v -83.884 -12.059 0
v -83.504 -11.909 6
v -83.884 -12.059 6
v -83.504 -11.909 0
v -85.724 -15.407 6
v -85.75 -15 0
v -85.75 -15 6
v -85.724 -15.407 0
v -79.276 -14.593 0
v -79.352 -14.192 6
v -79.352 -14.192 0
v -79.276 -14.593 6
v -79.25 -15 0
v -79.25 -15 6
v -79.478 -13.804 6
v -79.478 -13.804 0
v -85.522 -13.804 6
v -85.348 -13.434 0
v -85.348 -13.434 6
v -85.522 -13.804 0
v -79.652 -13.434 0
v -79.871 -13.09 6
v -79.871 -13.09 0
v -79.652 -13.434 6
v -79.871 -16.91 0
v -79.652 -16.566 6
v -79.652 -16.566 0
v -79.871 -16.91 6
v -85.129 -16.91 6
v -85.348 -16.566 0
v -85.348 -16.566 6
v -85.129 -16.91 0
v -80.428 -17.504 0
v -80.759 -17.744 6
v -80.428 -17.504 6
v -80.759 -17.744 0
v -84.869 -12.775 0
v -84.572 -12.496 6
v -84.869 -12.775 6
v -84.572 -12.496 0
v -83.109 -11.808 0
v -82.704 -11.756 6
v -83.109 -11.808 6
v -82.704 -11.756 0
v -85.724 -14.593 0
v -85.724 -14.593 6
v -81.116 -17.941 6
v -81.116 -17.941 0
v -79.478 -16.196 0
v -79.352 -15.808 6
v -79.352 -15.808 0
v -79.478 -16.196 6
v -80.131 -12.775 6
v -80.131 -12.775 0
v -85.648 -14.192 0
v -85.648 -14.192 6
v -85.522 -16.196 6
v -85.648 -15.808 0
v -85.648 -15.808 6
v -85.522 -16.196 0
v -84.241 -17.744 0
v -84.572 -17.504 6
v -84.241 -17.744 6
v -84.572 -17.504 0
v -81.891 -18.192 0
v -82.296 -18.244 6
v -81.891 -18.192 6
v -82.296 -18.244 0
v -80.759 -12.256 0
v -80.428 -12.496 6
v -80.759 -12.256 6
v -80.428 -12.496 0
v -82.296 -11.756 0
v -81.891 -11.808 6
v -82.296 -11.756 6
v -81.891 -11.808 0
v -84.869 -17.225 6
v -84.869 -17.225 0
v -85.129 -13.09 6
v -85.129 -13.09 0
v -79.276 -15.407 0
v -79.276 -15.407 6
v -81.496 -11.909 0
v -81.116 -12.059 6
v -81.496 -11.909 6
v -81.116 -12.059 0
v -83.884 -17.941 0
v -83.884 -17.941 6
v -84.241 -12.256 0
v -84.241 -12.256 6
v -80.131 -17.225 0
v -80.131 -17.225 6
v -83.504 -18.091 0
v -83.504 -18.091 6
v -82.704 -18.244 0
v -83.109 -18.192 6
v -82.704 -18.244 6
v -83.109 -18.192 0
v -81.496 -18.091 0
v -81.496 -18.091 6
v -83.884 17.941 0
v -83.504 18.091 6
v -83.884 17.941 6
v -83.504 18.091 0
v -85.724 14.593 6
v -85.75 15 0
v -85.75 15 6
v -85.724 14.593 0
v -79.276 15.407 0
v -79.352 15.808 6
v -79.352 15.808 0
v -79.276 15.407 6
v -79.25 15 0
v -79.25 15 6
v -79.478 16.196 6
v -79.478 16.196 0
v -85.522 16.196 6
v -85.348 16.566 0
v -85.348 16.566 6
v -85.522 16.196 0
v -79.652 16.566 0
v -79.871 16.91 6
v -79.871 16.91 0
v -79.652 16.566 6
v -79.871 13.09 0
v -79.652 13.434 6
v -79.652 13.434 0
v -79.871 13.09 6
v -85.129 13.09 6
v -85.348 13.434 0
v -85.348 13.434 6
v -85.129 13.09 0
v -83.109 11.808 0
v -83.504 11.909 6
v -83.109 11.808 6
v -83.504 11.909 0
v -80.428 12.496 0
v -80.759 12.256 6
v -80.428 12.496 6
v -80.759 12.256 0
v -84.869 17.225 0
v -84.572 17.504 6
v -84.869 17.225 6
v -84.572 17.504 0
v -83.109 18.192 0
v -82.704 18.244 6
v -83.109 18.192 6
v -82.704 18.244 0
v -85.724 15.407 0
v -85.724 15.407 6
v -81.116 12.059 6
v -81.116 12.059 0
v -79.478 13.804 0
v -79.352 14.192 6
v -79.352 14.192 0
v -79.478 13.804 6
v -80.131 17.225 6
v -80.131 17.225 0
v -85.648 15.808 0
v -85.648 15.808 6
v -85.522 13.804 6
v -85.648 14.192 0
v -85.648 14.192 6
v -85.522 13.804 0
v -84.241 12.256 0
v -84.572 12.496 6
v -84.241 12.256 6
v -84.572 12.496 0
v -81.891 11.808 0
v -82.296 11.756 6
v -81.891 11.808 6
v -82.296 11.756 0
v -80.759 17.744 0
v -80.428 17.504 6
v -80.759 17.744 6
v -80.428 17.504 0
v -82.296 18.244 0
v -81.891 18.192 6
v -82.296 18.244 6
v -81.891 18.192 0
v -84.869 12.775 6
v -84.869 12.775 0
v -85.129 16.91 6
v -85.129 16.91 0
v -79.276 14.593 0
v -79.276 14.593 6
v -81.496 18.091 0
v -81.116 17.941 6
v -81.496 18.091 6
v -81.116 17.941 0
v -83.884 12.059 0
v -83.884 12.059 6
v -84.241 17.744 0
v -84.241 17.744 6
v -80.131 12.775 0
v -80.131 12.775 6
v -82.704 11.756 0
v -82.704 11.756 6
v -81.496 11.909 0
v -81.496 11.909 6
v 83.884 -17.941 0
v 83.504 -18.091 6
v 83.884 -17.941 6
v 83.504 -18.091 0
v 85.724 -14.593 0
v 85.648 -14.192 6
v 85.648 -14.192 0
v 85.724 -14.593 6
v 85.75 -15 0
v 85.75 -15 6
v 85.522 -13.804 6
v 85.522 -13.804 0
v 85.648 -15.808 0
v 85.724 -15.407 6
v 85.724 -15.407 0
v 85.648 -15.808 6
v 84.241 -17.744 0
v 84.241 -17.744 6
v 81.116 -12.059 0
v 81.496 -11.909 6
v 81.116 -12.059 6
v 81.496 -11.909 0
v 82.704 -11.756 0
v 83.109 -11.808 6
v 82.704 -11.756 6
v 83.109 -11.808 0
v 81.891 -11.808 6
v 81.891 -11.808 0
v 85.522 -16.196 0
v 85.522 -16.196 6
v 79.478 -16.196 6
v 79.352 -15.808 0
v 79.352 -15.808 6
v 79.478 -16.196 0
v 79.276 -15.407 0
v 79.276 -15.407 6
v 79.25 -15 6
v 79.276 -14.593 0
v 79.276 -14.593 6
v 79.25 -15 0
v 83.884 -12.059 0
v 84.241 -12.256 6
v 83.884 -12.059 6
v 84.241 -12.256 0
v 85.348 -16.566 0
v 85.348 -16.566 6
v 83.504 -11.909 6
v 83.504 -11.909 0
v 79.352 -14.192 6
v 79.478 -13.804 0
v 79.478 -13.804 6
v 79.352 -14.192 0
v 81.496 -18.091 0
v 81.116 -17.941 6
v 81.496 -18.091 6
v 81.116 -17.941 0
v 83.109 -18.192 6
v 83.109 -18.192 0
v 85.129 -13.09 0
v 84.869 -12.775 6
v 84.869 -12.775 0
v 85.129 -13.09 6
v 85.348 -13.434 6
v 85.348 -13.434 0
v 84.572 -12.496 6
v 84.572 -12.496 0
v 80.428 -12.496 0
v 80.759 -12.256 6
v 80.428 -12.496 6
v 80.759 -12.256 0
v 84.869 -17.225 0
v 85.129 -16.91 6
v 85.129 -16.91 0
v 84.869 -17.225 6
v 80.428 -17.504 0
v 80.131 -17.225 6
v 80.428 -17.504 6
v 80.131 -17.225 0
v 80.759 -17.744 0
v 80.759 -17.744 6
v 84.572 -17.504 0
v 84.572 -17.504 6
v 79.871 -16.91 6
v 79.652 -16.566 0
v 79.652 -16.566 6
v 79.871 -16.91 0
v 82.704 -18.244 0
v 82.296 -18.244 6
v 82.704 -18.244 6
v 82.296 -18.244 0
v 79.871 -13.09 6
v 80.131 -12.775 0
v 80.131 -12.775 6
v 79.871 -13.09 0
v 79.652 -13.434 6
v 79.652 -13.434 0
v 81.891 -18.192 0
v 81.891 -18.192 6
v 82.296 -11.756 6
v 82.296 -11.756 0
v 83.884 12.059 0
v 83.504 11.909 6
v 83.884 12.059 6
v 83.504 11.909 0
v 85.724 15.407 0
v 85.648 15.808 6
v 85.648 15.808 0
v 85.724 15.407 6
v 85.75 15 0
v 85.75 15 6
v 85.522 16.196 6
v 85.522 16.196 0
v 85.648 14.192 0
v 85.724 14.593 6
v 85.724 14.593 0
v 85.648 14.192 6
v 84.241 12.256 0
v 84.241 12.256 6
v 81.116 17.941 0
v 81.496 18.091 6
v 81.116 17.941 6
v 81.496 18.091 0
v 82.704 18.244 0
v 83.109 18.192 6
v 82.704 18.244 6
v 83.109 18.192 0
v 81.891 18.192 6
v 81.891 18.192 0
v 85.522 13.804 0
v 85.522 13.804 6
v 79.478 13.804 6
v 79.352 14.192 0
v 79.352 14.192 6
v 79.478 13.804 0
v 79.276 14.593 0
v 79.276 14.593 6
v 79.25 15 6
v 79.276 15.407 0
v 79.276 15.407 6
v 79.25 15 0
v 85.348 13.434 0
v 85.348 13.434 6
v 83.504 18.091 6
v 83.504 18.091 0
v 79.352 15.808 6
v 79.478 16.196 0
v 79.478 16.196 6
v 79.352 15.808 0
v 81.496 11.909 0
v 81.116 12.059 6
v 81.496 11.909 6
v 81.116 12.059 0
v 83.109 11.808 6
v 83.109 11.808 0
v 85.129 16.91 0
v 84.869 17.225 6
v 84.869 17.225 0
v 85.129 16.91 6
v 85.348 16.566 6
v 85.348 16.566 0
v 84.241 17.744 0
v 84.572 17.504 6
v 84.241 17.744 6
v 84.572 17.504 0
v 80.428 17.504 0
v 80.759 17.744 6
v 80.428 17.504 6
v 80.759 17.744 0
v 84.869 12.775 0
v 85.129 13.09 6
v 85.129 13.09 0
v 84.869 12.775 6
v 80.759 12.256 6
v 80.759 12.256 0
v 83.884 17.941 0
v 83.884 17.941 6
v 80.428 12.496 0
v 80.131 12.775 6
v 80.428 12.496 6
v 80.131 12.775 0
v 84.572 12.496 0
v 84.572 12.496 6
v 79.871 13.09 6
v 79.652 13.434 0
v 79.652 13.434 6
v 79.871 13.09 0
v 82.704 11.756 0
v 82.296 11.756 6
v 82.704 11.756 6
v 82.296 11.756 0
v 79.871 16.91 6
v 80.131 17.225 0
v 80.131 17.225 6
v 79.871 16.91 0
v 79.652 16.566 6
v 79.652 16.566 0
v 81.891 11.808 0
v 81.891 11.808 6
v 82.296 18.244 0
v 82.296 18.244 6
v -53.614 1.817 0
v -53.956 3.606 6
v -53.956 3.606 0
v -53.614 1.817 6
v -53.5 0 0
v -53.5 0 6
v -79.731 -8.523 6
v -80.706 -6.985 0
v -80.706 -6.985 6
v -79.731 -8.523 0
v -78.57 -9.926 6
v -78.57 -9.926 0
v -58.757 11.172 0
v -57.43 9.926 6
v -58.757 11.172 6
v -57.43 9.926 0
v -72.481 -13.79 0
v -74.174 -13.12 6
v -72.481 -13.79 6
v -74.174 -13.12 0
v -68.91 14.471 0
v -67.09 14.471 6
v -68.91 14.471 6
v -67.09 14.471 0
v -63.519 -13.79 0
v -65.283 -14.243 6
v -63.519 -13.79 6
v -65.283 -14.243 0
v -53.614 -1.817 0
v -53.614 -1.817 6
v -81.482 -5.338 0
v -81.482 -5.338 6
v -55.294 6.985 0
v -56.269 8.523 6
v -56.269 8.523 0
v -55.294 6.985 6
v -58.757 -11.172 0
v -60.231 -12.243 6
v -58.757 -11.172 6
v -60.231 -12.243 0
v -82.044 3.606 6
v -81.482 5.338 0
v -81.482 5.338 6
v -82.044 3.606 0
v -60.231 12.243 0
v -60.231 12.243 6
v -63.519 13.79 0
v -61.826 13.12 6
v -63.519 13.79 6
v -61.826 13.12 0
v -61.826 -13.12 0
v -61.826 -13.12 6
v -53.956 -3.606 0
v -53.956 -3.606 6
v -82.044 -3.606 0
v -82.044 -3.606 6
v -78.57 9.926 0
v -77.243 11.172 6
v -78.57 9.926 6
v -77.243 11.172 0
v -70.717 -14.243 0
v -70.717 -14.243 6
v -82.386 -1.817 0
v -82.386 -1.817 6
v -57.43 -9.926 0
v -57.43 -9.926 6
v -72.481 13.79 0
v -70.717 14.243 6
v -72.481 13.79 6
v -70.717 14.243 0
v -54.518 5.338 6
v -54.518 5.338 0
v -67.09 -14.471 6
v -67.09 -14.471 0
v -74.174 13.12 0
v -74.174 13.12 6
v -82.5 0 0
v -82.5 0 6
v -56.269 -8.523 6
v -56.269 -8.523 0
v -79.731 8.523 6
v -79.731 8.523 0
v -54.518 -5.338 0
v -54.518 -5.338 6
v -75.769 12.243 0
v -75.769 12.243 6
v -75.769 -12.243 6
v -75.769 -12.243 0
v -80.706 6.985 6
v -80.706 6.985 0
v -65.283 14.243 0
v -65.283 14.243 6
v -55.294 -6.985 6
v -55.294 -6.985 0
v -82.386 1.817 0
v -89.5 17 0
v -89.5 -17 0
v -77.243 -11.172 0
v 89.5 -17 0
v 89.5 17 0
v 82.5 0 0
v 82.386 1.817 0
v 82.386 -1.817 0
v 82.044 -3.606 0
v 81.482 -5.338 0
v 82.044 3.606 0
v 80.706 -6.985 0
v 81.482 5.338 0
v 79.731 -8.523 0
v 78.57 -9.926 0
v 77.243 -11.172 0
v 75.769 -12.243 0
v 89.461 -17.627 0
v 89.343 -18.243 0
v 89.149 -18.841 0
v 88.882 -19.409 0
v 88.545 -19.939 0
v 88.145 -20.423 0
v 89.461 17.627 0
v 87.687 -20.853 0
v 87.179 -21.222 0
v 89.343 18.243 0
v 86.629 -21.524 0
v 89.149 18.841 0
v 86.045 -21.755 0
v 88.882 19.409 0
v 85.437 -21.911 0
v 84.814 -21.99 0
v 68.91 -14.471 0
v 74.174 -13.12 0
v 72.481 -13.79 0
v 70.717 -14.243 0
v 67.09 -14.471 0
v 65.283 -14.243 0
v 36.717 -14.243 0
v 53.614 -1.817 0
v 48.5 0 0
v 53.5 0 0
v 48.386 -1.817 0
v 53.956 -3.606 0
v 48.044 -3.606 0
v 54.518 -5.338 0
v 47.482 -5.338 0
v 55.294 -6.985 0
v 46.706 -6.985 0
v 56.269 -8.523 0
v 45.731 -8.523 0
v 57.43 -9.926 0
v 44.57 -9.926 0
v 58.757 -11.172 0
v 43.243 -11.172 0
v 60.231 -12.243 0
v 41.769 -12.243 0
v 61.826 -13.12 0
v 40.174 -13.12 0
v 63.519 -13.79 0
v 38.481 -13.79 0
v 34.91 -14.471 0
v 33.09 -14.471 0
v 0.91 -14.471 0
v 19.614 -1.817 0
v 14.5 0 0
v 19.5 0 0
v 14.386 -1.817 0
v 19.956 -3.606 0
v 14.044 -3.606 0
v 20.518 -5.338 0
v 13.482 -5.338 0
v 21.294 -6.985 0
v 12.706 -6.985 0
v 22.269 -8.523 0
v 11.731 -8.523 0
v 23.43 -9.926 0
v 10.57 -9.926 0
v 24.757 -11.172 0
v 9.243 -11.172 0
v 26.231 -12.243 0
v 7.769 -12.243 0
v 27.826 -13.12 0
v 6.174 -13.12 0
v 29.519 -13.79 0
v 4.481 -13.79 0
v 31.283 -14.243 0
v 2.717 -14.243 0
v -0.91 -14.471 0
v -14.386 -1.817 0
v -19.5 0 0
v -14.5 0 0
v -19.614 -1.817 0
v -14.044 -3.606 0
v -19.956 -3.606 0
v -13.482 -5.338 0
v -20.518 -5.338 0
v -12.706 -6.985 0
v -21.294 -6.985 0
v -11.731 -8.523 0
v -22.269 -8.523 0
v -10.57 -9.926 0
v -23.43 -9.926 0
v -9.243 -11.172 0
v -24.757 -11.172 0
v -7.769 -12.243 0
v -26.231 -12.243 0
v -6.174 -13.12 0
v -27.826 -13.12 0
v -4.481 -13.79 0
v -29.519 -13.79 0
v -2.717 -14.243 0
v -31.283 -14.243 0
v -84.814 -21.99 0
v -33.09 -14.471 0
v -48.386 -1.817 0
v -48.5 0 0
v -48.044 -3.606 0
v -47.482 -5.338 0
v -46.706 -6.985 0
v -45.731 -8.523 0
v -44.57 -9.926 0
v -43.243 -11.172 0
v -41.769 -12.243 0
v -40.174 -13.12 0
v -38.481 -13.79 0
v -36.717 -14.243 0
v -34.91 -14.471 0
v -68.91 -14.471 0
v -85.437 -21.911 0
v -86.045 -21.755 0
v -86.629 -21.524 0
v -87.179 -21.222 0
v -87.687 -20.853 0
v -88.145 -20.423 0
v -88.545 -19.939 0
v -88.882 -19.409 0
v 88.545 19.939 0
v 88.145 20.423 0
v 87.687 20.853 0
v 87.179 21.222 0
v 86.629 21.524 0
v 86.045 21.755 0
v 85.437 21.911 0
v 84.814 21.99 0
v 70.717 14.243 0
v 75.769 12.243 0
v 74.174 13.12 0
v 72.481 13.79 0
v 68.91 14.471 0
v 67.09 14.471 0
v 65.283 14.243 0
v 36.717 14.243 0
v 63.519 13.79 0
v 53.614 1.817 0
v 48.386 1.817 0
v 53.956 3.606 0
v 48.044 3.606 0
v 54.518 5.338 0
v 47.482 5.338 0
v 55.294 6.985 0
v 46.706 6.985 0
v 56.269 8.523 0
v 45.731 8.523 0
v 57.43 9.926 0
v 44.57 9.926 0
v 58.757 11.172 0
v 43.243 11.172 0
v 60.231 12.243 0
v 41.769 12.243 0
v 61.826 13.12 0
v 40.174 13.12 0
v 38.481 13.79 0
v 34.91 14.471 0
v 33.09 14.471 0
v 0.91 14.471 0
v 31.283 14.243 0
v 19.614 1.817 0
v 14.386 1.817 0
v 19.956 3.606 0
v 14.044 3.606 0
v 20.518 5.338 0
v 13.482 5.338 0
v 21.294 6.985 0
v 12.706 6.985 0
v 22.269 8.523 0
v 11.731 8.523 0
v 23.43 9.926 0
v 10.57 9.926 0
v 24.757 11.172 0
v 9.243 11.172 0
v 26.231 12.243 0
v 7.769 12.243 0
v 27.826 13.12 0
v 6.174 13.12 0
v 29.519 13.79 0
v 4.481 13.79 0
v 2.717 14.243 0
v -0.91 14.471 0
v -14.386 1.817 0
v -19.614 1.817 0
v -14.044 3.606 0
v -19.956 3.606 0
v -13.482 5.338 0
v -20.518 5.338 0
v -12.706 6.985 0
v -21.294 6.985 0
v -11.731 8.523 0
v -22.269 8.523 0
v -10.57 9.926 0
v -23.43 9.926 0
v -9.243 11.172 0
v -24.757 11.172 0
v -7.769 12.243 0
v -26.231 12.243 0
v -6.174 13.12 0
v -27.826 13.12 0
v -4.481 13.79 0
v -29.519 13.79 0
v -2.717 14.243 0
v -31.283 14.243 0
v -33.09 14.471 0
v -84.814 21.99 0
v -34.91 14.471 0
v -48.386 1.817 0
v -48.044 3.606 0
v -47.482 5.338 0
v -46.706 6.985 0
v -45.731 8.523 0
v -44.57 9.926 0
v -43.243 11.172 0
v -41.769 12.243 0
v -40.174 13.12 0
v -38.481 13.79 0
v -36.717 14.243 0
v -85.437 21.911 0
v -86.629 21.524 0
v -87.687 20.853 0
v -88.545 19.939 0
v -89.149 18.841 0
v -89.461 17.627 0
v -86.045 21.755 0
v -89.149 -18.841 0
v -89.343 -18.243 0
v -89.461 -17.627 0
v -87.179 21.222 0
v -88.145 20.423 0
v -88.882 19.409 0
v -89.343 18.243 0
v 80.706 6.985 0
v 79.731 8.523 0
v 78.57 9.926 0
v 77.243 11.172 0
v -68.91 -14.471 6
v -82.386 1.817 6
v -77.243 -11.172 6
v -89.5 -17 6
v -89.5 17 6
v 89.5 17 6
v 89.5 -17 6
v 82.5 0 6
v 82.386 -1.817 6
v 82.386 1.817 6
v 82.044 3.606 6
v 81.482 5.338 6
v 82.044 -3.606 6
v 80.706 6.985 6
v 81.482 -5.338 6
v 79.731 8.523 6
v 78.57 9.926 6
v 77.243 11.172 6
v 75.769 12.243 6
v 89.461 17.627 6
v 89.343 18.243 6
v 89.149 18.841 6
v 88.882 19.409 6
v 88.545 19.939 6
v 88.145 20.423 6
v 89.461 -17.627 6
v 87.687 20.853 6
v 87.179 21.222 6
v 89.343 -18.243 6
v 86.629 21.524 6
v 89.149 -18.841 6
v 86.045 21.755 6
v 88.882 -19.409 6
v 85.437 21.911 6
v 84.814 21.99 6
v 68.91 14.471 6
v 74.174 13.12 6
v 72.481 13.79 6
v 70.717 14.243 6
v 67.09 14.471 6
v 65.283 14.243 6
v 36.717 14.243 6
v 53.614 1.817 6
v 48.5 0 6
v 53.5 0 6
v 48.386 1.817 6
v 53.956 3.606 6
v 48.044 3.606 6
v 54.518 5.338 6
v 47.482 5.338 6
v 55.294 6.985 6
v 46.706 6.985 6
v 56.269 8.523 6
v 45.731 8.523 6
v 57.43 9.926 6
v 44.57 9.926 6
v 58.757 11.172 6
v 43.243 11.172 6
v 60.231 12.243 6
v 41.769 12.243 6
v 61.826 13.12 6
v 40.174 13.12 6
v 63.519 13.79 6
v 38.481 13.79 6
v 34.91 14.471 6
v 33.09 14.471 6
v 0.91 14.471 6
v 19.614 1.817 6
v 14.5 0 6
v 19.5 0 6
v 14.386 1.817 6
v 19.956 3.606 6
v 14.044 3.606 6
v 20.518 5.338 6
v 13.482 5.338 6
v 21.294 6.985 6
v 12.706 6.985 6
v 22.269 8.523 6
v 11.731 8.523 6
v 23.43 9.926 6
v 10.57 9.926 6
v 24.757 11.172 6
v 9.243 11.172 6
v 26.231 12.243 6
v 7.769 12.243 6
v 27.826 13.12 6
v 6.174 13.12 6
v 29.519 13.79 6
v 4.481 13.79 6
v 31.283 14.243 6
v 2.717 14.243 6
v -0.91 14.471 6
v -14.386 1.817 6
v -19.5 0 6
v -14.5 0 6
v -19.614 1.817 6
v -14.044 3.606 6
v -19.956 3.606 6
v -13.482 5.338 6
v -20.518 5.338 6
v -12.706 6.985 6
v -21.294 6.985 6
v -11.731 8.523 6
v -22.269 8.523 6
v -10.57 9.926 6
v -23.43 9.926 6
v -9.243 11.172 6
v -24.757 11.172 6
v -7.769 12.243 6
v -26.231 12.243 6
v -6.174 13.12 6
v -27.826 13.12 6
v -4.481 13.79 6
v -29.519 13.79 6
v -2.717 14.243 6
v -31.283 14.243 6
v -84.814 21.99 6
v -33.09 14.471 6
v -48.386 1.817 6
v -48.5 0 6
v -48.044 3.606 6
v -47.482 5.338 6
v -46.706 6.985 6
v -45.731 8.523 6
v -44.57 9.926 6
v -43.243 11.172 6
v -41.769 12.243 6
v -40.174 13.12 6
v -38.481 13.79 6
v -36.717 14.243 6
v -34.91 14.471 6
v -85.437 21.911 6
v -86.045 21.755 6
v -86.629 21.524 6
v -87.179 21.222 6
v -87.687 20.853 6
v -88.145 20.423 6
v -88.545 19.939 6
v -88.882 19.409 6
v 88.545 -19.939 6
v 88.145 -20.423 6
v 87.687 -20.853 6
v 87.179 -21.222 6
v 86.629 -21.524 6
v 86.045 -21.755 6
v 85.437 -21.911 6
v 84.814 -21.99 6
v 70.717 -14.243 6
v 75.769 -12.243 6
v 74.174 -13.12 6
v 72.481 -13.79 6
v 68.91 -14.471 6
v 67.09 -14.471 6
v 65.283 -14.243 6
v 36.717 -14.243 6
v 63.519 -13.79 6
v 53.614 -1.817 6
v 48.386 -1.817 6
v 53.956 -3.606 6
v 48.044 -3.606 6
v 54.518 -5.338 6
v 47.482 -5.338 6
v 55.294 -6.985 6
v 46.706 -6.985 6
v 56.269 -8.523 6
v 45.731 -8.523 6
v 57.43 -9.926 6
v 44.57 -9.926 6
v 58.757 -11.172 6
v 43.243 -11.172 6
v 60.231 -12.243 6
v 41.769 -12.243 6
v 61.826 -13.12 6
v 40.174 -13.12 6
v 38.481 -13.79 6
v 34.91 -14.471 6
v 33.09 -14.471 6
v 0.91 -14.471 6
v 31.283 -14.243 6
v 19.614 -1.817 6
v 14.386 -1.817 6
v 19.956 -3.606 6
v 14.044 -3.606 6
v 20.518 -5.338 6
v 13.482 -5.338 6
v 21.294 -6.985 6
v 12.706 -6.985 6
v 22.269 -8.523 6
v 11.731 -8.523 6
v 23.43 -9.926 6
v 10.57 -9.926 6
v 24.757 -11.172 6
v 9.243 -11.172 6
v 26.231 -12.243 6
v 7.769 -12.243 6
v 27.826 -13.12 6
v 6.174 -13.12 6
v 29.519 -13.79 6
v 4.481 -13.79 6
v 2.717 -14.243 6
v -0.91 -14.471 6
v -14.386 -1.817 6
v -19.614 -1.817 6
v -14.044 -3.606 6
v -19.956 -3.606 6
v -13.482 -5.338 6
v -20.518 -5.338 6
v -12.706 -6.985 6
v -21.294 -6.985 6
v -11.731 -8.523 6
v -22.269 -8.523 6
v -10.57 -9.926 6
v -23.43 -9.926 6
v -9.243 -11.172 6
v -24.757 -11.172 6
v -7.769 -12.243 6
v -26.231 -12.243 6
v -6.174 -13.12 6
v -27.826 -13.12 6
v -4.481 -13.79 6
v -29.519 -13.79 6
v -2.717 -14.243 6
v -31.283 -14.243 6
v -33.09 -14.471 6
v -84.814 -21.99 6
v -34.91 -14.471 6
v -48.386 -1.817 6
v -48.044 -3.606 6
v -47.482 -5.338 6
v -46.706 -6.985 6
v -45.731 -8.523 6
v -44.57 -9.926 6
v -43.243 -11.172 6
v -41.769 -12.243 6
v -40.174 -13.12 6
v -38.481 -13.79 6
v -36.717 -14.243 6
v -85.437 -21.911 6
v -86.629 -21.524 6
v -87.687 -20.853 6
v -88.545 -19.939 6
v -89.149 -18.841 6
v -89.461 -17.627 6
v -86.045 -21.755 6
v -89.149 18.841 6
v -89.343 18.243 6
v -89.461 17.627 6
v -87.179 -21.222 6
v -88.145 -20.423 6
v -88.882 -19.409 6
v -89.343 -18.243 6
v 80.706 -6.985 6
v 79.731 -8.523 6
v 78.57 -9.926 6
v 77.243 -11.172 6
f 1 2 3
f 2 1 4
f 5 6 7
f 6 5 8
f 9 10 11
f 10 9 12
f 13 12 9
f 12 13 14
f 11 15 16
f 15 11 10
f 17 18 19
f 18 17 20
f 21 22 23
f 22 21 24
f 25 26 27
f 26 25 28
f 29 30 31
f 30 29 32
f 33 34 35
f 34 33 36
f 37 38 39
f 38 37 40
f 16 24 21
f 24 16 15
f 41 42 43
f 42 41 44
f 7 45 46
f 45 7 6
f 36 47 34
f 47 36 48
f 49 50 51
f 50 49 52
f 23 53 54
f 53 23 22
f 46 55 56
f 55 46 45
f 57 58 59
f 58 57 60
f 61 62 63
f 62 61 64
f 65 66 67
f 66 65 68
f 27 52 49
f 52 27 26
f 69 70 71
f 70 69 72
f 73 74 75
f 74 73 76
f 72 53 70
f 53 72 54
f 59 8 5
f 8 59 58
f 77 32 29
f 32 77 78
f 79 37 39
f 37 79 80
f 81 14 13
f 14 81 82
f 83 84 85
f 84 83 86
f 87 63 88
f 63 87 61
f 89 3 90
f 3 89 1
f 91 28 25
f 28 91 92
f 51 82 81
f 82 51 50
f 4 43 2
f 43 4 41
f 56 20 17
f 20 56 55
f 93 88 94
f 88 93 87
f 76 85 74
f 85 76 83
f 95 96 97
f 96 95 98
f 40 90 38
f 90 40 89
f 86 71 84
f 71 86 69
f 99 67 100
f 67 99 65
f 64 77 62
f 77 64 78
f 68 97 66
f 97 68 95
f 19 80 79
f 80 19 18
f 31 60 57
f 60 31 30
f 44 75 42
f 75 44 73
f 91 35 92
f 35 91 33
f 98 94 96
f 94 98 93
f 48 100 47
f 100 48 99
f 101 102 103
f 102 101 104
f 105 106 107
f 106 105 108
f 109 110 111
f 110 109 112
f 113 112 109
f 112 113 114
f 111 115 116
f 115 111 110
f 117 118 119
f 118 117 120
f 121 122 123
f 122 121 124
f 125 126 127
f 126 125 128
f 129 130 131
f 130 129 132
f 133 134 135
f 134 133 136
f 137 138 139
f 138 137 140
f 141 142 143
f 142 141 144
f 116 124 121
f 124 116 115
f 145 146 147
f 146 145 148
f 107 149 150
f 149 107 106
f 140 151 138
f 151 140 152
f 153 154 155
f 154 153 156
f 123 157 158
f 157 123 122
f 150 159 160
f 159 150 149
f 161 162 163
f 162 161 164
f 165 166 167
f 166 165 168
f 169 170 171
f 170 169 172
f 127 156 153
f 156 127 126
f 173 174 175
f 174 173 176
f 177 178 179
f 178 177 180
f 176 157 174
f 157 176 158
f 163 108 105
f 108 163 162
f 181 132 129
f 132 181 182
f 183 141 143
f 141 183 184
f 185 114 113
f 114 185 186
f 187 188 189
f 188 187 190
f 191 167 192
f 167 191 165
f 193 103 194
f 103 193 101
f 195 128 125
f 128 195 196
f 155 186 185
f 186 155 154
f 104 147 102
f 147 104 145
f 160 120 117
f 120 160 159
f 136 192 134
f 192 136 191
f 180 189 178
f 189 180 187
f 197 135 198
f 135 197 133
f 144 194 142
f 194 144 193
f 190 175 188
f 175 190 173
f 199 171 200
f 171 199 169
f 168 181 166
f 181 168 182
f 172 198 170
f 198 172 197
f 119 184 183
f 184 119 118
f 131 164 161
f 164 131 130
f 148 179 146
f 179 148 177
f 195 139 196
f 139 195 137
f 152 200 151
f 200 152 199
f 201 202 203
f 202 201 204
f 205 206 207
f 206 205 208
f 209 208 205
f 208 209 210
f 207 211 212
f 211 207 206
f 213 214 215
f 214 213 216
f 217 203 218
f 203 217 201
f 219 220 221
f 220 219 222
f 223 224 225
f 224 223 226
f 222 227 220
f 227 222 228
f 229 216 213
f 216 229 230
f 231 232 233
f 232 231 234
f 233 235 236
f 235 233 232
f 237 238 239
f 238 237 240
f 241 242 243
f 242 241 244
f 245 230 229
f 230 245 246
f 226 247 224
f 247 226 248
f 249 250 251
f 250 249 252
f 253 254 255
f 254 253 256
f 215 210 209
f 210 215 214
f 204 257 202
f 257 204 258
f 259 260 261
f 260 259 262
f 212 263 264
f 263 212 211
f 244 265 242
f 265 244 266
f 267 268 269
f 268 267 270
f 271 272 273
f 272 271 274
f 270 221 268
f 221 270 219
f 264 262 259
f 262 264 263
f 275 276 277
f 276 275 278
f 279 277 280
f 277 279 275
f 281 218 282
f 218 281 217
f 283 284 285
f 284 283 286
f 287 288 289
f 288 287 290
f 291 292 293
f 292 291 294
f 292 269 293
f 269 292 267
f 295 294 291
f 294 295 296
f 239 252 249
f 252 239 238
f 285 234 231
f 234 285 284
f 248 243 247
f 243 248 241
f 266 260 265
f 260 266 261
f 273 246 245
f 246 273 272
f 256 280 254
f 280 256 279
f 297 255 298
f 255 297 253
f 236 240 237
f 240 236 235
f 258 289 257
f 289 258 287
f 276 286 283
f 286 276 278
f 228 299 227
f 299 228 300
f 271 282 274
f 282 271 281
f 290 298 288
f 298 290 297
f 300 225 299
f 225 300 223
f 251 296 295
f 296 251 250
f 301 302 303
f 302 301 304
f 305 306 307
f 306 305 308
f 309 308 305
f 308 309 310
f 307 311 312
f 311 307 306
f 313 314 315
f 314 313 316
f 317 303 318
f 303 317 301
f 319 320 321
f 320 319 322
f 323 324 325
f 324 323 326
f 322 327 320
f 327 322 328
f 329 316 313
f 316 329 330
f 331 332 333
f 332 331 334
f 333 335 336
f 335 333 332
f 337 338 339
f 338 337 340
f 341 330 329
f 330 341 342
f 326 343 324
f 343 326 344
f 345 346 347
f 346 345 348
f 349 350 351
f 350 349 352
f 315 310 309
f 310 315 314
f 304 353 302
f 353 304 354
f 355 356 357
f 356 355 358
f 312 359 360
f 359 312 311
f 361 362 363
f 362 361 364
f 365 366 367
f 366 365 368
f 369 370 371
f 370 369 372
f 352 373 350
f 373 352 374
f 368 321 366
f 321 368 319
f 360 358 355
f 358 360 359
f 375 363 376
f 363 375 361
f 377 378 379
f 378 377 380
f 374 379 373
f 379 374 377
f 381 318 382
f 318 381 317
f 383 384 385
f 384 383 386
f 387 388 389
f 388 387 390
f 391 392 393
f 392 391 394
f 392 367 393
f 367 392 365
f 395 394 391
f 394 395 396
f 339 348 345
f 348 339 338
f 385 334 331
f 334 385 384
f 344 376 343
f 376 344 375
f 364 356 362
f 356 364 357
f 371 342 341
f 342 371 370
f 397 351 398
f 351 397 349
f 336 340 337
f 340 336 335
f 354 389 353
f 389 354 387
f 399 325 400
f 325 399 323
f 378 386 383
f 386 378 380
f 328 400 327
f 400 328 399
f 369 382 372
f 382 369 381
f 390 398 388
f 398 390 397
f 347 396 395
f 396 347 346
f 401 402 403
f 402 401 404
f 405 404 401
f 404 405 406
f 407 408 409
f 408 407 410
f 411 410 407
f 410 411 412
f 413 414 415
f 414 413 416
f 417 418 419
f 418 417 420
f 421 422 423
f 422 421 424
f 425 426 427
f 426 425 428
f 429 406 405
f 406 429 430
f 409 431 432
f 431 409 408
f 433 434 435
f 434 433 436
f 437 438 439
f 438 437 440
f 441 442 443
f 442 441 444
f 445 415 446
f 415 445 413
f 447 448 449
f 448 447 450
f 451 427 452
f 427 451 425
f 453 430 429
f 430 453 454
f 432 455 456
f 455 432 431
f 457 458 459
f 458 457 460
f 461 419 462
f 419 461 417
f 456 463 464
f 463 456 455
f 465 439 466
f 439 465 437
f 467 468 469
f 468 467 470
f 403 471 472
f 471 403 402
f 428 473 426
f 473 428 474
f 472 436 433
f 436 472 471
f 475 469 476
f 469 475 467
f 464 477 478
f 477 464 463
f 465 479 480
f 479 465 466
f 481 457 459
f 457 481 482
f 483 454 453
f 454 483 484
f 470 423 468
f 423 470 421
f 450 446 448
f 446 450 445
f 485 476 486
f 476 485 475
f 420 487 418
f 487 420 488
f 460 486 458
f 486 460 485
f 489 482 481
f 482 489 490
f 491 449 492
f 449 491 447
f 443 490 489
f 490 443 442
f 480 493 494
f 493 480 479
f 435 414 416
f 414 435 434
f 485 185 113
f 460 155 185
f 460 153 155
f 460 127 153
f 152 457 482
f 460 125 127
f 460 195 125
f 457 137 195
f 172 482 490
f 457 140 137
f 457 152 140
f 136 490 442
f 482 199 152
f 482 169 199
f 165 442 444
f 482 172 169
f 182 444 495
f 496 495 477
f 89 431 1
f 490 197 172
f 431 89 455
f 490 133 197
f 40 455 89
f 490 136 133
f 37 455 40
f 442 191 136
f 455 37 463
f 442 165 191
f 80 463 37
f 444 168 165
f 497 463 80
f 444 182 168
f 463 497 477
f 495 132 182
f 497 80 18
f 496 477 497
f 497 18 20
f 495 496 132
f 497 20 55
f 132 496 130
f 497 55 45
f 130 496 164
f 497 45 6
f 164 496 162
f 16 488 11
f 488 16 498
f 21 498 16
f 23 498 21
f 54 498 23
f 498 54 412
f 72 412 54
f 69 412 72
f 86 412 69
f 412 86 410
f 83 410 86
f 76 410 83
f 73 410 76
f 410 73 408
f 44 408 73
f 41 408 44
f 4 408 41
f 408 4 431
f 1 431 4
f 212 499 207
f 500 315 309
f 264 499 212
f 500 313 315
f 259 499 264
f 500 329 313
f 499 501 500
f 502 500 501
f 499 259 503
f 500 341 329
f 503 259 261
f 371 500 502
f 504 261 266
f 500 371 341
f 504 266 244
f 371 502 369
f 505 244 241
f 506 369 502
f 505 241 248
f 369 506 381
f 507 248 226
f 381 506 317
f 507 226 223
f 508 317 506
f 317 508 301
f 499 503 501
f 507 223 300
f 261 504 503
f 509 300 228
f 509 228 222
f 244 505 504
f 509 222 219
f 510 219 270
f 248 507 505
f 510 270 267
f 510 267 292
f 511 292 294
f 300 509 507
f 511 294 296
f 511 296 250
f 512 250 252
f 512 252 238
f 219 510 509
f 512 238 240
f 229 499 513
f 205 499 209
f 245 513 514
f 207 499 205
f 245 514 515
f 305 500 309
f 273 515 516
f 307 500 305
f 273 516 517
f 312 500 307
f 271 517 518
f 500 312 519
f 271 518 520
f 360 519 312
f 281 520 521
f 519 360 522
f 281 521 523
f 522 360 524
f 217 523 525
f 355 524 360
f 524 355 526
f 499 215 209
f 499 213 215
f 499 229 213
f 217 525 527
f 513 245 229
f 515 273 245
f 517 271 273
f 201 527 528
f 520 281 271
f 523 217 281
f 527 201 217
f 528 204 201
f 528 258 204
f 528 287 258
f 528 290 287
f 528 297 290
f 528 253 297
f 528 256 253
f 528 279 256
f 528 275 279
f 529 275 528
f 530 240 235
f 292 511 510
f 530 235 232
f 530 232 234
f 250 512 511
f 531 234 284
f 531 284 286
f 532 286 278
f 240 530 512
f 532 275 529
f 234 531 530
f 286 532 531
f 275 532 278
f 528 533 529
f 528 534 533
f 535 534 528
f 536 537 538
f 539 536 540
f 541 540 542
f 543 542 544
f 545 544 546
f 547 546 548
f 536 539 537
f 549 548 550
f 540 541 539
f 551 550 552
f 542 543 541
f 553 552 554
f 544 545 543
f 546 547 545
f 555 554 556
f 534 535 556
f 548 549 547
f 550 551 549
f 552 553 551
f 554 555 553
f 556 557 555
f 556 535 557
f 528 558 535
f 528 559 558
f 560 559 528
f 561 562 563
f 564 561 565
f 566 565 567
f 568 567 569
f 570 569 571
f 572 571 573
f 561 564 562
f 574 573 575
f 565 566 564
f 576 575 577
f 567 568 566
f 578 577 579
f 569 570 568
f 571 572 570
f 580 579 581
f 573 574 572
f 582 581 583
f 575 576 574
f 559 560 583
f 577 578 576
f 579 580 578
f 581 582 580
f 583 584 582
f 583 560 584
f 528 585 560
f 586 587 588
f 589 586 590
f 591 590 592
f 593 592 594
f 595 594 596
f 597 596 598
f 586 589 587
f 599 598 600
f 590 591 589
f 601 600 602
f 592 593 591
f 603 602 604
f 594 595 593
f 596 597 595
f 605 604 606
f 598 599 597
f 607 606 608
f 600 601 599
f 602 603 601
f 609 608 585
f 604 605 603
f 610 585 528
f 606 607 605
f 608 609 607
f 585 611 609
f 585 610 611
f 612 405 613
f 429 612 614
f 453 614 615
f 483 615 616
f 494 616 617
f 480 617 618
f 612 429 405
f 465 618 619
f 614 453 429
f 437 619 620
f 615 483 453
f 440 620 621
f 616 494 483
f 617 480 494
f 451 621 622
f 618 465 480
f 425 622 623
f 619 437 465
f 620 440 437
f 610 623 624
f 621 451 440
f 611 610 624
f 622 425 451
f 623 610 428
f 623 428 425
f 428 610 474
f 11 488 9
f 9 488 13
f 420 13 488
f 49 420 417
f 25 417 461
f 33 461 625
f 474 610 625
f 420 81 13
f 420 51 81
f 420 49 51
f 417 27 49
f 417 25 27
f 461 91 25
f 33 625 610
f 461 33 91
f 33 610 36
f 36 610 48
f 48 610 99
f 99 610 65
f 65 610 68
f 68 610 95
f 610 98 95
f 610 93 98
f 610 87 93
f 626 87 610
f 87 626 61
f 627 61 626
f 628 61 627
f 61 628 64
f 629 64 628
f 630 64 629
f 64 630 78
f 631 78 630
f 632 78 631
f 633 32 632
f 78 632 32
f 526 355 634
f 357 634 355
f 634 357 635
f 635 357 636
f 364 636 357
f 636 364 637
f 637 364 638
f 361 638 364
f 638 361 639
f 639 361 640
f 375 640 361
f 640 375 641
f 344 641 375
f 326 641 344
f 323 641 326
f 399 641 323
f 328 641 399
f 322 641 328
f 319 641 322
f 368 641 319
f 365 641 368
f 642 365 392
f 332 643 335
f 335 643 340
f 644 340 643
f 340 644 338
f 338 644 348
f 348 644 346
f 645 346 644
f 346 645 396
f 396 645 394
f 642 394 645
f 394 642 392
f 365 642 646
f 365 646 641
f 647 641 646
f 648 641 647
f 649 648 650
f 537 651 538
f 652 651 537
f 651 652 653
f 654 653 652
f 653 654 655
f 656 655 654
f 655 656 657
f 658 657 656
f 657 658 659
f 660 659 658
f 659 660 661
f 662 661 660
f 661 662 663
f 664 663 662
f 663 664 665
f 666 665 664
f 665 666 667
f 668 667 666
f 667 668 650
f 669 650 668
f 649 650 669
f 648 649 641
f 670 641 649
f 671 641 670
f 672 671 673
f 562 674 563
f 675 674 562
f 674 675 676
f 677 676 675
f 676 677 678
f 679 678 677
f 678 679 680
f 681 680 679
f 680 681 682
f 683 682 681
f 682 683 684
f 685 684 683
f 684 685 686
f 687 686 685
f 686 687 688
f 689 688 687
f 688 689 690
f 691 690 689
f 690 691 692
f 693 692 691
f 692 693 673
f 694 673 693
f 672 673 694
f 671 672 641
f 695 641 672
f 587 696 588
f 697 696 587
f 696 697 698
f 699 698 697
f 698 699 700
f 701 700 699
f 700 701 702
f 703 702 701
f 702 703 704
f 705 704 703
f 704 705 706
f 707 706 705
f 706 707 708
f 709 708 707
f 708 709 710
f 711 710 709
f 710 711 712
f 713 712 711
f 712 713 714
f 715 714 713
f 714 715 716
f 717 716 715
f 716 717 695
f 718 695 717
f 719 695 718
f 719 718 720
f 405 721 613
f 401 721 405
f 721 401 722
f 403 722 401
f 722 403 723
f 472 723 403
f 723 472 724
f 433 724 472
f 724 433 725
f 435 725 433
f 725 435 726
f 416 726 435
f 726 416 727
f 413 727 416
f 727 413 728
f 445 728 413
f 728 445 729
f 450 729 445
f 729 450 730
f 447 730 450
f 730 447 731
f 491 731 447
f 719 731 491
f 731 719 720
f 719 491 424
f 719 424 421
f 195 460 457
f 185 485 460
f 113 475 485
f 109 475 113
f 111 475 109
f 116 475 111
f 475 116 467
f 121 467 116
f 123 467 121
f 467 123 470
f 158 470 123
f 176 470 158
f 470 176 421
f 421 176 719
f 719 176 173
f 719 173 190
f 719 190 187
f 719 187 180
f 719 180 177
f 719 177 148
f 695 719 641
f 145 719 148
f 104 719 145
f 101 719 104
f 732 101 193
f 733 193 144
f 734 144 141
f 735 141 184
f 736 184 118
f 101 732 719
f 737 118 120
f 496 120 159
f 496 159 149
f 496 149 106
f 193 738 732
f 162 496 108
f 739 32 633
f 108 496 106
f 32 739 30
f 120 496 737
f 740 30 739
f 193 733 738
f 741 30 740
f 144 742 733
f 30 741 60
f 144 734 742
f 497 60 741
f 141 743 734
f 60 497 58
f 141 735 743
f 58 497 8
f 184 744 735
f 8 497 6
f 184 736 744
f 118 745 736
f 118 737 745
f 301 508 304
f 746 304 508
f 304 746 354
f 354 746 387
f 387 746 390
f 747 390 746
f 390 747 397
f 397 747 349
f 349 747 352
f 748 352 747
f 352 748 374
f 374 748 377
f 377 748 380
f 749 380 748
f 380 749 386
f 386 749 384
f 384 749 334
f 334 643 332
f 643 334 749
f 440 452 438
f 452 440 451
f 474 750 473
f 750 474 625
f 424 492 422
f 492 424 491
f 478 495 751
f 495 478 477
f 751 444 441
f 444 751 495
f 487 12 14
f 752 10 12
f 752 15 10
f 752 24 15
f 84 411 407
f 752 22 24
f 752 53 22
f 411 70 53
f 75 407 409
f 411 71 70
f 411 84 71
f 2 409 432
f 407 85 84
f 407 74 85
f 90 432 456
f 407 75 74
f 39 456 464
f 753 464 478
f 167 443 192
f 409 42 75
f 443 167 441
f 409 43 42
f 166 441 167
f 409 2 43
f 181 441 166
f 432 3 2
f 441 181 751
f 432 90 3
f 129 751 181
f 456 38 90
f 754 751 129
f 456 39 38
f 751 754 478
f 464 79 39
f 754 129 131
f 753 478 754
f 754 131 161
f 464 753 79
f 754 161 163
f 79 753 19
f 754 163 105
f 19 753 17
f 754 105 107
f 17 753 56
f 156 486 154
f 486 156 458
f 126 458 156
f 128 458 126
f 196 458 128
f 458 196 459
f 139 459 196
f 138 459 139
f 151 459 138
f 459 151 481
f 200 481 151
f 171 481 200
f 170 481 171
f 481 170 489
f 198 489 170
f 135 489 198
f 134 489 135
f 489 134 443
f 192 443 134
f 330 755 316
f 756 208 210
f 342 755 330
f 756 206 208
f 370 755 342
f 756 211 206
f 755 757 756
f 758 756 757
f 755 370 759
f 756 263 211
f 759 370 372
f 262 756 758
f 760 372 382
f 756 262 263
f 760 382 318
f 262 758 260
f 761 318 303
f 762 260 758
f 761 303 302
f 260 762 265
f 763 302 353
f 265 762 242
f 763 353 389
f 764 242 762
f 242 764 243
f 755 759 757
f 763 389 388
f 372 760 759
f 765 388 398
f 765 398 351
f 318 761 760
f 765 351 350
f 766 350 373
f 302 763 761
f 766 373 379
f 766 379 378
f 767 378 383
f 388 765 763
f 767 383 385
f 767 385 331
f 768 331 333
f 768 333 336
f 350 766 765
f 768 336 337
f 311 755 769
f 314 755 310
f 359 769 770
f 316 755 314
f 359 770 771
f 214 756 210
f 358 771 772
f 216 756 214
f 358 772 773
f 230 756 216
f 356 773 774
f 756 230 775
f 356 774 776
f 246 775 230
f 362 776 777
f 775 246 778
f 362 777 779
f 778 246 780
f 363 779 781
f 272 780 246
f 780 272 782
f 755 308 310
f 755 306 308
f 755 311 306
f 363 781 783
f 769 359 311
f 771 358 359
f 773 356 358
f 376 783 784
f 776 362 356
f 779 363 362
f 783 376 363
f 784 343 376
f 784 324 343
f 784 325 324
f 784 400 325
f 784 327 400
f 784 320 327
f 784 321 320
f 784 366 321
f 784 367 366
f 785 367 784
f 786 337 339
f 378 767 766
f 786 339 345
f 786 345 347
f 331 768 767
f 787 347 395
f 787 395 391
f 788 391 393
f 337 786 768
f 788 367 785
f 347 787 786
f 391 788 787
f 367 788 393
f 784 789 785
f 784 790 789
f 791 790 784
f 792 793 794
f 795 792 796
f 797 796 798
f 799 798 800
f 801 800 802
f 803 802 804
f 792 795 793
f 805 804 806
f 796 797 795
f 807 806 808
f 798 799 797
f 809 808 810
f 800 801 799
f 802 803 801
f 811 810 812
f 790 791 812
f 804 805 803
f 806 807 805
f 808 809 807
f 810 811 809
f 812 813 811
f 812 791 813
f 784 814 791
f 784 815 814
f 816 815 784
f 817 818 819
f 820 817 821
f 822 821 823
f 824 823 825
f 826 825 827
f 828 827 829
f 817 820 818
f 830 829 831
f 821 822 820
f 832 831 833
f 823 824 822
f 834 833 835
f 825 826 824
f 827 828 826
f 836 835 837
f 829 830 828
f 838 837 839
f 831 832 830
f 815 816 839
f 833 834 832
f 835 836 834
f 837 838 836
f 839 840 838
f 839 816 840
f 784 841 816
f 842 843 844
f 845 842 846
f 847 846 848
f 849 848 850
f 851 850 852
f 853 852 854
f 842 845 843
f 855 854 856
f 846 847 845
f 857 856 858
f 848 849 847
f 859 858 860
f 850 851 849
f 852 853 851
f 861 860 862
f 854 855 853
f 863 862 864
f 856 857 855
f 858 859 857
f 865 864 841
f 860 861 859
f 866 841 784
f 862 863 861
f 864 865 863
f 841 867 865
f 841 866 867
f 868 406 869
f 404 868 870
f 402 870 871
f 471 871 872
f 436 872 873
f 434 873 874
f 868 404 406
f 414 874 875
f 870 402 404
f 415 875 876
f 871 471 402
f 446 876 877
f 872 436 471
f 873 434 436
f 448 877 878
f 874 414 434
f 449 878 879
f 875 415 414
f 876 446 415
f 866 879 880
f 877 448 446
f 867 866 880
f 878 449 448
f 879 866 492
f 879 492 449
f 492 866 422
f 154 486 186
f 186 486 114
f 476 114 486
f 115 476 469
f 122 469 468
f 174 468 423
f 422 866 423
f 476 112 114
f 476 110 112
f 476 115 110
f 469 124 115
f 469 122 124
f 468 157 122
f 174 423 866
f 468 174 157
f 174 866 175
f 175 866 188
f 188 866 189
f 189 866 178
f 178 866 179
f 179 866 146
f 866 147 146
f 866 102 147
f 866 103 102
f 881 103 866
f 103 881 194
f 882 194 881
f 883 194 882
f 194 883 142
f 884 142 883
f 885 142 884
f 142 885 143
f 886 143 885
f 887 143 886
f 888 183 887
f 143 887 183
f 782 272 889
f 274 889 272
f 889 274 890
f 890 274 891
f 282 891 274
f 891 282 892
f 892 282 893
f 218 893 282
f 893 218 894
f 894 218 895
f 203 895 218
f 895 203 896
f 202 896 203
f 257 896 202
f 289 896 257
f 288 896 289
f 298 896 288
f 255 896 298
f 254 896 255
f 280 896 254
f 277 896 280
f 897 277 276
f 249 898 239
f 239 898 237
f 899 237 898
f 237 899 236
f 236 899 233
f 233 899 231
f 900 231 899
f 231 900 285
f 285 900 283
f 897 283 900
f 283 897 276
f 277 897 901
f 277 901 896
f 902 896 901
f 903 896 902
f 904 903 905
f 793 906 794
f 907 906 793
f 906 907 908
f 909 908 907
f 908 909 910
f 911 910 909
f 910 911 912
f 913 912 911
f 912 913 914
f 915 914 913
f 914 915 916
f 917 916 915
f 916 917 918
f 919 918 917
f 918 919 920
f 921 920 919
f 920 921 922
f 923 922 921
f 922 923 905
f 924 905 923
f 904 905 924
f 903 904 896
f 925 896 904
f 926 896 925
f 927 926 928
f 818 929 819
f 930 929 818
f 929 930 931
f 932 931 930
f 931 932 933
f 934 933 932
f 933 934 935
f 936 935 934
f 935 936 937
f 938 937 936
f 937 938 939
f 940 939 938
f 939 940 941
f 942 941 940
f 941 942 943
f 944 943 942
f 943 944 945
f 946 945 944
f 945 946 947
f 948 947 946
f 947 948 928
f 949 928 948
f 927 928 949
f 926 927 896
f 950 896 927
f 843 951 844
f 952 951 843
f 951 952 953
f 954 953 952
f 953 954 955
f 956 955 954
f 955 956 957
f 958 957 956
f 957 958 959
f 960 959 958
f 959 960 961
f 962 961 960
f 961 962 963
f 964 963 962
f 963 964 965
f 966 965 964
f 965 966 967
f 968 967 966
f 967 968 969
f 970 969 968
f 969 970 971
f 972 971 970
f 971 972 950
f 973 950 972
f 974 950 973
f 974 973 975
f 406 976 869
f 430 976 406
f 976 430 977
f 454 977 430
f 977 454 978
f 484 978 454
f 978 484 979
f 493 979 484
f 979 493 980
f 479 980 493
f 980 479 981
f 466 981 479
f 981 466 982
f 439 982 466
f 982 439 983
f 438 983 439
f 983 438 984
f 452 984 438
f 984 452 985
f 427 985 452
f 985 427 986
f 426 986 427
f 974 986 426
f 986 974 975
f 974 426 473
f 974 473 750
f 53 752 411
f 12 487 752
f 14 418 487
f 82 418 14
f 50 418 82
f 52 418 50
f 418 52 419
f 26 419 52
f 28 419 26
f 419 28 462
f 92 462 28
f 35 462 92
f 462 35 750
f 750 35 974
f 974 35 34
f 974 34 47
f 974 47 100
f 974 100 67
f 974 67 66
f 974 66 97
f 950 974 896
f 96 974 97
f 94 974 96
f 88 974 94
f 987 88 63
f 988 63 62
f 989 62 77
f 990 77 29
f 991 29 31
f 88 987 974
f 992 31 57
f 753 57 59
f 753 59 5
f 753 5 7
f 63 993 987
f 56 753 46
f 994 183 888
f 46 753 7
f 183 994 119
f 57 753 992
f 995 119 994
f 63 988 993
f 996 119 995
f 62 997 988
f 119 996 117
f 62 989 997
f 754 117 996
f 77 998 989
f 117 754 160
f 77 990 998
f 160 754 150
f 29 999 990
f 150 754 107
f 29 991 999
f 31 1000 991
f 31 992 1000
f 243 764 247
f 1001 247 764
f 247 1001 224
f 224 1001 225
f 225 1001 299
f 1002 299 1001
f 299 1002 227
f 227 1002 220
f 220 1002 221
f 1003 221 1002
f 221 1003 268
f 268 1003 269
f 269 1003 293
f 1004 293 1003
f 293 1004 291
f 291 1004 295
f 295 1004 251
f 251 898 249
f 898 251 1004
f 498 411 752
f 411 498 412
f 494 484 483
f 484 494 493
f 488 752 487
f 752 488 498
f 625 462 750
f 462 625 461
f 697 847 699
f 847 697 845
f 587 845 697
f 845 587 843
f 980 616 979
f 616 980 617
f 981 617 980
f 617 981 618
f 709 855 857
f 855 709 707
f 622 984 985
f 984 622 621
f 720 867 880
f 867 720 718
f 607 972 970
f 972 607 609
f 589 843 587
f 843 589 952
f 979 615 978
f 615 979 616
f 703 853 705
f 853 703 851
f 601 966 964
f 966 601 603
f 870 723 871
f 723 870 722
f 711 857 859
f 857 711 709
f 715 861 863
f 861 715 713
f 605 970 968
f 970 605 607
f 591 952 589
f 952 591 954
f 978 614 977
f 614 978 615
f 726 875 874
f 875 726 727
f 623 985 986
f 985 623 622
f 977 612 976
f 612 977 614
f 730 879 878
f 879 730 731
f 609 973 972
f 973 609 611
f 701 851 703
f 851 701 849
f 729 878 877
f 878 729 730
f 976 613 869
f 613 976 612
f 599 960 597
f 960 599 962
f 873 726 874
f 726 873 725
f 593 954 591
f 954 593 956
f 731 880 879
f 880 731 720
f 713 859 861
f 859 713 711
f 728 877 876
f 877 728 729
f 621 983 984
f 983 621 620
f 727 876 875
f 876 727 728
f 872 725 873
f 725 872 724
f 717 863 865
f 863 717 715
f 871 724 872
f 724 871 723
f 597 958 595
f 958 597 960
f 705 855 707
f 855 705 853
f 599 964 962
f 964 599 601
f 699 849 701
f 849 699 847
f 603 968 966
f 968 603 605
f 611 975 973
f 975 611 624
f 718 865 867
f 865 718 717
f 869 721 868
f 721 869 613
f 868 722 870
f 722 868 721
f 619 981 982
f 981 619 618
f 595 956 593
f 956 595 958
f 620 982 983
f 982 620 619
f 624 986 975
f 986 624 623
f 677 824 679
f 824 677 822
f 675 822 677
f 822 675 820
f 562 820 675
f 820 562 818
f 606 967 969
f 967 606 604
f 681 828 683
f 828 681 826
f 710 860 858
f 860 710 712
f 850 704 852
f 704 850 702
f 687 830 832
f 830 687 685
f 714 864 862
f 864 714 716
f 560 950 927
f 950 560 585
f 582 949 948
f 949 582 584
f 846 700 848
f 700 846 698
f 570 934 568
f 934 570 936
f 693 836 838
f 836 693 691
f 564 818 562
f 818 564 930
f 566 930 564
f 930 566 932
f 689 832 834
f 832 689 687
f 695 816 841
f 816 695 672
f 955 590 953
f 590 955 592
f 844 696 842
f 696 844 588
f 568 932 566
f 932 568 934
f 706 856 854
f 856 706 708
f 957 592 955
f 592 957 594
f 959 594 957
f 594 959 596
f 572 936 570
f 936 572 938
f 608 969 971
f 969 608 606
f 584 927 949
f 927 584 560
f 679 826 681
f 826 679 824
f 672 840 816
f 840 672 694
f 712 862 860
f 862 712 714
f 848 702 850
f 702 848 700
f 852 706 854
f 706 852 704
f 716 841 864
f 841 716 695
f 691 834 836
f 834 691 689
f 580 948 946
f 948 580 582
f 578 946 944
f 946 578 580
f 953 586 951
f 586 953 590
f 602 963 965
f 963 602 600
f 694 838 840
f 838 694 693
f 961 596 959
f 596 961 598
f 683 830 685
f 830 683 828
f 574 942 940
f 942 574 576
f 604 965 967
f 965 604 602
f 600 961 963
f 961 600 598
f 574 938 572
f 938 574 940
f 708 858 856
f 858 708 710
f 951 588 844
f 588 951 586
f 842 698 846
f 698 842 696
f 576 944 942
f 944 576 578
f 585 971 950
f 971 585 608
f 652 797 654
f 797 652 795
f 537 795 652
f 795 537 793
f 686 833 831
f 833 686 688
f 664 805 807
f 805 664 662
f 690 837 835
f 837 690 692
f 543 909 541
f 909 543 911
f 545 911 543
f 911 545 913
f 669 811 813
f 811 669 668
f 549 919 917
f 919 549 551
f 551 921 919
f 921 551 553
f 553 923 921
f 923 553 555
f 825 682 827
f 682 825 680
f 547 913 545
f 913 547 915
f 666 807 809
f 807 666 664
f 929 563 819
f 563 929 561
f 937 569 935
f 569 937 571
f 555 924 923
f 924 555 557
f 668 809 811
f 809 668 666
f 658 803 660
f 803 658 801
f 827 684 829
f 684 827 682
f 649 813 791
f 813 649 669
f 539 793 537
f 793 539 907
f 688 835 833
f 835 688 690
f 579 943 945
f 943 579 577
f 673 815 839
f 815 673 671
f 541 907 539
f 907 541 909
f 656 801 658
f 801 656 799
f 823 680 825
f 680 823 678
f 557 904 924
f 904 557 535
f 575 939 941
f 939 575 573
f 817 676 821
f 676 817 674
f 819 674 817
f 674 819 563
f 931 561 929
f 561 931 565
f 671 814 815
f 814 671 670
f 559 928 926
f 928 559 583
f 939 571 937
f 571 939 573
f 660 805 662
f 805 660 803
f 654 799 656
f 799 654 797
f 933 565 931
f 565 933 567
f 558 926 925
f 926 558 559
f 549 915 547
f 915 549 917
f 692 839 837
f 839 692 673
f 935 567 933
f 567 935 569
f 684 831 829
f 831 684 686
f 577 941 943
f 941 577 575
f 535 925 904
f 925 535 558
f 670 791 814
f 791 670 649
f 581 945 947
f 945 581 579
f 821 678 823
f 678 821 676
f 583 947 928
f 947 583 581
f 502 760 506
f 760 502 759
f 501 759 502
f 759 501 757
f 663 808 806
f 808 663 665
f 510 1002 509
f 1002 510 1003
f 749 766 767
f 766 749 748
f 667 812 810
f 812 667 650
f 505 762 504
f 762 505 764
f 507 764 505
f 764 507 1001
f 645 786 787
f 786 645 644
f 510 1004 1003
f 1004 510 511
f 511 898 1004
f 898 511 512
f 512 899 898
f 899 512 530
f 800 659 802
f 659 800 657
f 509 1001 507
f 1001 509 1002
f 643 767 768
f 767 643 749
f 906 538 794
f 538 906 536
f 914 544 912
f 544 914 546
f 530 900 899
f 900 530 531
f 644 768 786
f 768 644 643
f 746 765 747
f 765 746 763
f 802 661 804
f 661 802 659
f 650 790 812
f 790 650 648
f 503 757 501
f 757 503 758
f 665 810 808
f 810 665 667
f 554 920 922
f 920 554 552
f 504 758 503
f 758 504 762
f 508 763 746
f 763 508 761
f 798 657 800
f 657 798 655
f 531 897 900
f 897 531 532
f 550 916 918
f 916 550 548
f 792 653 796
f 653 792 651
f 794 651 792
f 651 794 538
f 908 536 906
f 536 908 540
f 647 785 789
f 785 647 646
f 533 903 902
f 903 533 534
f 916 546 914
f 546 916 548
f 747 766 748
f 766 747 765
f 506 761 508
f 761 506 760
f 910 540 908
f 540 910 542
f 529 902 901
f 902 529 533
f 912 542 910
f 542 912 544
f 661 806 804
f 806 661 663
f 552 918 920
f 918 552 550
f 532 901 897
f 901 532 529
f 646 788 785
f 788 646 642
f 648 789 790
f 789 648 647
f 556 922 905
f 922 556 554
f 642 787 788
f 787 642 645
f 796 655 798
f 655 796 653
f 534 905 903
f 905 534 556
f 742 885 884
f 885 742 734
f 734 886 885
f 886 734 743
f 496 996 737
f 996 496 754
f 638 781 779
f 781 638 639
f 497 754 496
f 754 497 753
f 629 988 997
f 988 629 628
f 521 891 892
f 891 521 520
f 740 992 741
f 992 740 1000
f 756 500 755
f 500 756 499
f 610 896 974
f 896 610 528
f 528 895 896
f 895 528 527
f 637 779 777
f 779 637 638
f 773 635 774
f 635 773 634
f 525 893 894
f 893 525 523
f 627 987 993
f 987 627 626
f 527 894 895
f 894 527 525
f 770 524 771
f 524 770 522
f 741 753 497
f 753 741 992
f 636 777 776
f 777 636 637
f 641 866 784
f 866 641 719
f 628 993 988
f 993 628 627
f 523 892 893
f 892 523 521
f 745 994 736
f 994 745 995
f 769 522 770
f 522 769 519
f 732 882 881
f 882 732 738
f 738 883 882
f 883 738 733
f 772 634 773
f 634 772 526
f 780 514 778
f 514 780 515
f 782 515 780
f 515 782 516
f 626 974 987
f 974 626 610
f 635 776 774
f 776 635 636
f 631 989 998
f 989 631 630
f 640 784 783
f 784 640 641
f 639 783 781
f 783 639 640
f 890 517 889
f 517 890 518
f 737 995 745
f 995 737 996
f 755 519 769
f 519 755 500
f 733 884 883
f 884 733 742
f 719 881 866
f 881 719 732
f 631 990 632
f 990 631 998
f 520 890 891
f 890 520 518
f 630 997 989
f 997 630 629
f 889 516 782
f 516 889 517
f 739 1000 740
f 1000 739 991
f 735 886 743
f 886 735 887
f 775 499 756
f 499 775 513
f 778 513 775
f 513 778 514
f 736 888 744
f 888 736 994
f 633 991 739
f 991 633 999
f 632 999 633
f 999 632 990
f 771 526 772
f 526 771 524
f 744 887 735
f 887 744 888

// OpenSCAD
$fn = 50;


difference() {
	union() {
		hull() {
			translate(v = [-84.5000000000, 17.0000000000, 0]) {
				cylinder(h = 6, r = 5);
			}
			translate(v = [84.5000000000, 17.0000000000, 0]) {
				cylinder(h = 6, r = 5);
			}
			translate(v = [-84.5000000000, -17.0000000000, 0]) {
				cylinder(h = 6, r = 5);
			}
			translate(v = [84.5000000000, -17.0000000000, 0]) {
				cylinder(h = 6, r = 5);
			}
		}
	}
	union() {
		#translate(v = [-82.5000000000, -15.0000000000, -100.0000000000]) {
			cylinder(h = 200, r = 3.2500000000);
		}
		#translate(v = [-82.5000000000, 15.0000000000, -100.0000000000]) {
			cylinder(h = 200, r = 3.2500000000);
		}
		#translate(v = [82.5000000000, -15.0000000000, -100.0000000000]) {
			cylinder(h = 200, r = 3.2500000000);
		}
		#translate(v = [82.5000000000, 15.0000000000, -100.0000000000]) {
			cylinder(h = 200, r = 3.2500000000);
		}
		#translate(v = [-68.0000000000, 0, 0]) {
			cylinder(h = 6, r = 14.5000000000);
		}
		#translate(v = [-34.0000000000, 0, 0]) {
			cylinder(h = 6, r = 14.5000000000);
		}
		#cylinder(h = 6, r = 14.5000000000);
		#translate(v = [34.0000000000, 0, 0]) {
			cylinder(h = 6, r = 14.5000000000);
		}
		#translate(v = [68.0000000000, 0, 0]) {
			cylinder(h = 6, r = 14.5000000000);
		}
	}
}
